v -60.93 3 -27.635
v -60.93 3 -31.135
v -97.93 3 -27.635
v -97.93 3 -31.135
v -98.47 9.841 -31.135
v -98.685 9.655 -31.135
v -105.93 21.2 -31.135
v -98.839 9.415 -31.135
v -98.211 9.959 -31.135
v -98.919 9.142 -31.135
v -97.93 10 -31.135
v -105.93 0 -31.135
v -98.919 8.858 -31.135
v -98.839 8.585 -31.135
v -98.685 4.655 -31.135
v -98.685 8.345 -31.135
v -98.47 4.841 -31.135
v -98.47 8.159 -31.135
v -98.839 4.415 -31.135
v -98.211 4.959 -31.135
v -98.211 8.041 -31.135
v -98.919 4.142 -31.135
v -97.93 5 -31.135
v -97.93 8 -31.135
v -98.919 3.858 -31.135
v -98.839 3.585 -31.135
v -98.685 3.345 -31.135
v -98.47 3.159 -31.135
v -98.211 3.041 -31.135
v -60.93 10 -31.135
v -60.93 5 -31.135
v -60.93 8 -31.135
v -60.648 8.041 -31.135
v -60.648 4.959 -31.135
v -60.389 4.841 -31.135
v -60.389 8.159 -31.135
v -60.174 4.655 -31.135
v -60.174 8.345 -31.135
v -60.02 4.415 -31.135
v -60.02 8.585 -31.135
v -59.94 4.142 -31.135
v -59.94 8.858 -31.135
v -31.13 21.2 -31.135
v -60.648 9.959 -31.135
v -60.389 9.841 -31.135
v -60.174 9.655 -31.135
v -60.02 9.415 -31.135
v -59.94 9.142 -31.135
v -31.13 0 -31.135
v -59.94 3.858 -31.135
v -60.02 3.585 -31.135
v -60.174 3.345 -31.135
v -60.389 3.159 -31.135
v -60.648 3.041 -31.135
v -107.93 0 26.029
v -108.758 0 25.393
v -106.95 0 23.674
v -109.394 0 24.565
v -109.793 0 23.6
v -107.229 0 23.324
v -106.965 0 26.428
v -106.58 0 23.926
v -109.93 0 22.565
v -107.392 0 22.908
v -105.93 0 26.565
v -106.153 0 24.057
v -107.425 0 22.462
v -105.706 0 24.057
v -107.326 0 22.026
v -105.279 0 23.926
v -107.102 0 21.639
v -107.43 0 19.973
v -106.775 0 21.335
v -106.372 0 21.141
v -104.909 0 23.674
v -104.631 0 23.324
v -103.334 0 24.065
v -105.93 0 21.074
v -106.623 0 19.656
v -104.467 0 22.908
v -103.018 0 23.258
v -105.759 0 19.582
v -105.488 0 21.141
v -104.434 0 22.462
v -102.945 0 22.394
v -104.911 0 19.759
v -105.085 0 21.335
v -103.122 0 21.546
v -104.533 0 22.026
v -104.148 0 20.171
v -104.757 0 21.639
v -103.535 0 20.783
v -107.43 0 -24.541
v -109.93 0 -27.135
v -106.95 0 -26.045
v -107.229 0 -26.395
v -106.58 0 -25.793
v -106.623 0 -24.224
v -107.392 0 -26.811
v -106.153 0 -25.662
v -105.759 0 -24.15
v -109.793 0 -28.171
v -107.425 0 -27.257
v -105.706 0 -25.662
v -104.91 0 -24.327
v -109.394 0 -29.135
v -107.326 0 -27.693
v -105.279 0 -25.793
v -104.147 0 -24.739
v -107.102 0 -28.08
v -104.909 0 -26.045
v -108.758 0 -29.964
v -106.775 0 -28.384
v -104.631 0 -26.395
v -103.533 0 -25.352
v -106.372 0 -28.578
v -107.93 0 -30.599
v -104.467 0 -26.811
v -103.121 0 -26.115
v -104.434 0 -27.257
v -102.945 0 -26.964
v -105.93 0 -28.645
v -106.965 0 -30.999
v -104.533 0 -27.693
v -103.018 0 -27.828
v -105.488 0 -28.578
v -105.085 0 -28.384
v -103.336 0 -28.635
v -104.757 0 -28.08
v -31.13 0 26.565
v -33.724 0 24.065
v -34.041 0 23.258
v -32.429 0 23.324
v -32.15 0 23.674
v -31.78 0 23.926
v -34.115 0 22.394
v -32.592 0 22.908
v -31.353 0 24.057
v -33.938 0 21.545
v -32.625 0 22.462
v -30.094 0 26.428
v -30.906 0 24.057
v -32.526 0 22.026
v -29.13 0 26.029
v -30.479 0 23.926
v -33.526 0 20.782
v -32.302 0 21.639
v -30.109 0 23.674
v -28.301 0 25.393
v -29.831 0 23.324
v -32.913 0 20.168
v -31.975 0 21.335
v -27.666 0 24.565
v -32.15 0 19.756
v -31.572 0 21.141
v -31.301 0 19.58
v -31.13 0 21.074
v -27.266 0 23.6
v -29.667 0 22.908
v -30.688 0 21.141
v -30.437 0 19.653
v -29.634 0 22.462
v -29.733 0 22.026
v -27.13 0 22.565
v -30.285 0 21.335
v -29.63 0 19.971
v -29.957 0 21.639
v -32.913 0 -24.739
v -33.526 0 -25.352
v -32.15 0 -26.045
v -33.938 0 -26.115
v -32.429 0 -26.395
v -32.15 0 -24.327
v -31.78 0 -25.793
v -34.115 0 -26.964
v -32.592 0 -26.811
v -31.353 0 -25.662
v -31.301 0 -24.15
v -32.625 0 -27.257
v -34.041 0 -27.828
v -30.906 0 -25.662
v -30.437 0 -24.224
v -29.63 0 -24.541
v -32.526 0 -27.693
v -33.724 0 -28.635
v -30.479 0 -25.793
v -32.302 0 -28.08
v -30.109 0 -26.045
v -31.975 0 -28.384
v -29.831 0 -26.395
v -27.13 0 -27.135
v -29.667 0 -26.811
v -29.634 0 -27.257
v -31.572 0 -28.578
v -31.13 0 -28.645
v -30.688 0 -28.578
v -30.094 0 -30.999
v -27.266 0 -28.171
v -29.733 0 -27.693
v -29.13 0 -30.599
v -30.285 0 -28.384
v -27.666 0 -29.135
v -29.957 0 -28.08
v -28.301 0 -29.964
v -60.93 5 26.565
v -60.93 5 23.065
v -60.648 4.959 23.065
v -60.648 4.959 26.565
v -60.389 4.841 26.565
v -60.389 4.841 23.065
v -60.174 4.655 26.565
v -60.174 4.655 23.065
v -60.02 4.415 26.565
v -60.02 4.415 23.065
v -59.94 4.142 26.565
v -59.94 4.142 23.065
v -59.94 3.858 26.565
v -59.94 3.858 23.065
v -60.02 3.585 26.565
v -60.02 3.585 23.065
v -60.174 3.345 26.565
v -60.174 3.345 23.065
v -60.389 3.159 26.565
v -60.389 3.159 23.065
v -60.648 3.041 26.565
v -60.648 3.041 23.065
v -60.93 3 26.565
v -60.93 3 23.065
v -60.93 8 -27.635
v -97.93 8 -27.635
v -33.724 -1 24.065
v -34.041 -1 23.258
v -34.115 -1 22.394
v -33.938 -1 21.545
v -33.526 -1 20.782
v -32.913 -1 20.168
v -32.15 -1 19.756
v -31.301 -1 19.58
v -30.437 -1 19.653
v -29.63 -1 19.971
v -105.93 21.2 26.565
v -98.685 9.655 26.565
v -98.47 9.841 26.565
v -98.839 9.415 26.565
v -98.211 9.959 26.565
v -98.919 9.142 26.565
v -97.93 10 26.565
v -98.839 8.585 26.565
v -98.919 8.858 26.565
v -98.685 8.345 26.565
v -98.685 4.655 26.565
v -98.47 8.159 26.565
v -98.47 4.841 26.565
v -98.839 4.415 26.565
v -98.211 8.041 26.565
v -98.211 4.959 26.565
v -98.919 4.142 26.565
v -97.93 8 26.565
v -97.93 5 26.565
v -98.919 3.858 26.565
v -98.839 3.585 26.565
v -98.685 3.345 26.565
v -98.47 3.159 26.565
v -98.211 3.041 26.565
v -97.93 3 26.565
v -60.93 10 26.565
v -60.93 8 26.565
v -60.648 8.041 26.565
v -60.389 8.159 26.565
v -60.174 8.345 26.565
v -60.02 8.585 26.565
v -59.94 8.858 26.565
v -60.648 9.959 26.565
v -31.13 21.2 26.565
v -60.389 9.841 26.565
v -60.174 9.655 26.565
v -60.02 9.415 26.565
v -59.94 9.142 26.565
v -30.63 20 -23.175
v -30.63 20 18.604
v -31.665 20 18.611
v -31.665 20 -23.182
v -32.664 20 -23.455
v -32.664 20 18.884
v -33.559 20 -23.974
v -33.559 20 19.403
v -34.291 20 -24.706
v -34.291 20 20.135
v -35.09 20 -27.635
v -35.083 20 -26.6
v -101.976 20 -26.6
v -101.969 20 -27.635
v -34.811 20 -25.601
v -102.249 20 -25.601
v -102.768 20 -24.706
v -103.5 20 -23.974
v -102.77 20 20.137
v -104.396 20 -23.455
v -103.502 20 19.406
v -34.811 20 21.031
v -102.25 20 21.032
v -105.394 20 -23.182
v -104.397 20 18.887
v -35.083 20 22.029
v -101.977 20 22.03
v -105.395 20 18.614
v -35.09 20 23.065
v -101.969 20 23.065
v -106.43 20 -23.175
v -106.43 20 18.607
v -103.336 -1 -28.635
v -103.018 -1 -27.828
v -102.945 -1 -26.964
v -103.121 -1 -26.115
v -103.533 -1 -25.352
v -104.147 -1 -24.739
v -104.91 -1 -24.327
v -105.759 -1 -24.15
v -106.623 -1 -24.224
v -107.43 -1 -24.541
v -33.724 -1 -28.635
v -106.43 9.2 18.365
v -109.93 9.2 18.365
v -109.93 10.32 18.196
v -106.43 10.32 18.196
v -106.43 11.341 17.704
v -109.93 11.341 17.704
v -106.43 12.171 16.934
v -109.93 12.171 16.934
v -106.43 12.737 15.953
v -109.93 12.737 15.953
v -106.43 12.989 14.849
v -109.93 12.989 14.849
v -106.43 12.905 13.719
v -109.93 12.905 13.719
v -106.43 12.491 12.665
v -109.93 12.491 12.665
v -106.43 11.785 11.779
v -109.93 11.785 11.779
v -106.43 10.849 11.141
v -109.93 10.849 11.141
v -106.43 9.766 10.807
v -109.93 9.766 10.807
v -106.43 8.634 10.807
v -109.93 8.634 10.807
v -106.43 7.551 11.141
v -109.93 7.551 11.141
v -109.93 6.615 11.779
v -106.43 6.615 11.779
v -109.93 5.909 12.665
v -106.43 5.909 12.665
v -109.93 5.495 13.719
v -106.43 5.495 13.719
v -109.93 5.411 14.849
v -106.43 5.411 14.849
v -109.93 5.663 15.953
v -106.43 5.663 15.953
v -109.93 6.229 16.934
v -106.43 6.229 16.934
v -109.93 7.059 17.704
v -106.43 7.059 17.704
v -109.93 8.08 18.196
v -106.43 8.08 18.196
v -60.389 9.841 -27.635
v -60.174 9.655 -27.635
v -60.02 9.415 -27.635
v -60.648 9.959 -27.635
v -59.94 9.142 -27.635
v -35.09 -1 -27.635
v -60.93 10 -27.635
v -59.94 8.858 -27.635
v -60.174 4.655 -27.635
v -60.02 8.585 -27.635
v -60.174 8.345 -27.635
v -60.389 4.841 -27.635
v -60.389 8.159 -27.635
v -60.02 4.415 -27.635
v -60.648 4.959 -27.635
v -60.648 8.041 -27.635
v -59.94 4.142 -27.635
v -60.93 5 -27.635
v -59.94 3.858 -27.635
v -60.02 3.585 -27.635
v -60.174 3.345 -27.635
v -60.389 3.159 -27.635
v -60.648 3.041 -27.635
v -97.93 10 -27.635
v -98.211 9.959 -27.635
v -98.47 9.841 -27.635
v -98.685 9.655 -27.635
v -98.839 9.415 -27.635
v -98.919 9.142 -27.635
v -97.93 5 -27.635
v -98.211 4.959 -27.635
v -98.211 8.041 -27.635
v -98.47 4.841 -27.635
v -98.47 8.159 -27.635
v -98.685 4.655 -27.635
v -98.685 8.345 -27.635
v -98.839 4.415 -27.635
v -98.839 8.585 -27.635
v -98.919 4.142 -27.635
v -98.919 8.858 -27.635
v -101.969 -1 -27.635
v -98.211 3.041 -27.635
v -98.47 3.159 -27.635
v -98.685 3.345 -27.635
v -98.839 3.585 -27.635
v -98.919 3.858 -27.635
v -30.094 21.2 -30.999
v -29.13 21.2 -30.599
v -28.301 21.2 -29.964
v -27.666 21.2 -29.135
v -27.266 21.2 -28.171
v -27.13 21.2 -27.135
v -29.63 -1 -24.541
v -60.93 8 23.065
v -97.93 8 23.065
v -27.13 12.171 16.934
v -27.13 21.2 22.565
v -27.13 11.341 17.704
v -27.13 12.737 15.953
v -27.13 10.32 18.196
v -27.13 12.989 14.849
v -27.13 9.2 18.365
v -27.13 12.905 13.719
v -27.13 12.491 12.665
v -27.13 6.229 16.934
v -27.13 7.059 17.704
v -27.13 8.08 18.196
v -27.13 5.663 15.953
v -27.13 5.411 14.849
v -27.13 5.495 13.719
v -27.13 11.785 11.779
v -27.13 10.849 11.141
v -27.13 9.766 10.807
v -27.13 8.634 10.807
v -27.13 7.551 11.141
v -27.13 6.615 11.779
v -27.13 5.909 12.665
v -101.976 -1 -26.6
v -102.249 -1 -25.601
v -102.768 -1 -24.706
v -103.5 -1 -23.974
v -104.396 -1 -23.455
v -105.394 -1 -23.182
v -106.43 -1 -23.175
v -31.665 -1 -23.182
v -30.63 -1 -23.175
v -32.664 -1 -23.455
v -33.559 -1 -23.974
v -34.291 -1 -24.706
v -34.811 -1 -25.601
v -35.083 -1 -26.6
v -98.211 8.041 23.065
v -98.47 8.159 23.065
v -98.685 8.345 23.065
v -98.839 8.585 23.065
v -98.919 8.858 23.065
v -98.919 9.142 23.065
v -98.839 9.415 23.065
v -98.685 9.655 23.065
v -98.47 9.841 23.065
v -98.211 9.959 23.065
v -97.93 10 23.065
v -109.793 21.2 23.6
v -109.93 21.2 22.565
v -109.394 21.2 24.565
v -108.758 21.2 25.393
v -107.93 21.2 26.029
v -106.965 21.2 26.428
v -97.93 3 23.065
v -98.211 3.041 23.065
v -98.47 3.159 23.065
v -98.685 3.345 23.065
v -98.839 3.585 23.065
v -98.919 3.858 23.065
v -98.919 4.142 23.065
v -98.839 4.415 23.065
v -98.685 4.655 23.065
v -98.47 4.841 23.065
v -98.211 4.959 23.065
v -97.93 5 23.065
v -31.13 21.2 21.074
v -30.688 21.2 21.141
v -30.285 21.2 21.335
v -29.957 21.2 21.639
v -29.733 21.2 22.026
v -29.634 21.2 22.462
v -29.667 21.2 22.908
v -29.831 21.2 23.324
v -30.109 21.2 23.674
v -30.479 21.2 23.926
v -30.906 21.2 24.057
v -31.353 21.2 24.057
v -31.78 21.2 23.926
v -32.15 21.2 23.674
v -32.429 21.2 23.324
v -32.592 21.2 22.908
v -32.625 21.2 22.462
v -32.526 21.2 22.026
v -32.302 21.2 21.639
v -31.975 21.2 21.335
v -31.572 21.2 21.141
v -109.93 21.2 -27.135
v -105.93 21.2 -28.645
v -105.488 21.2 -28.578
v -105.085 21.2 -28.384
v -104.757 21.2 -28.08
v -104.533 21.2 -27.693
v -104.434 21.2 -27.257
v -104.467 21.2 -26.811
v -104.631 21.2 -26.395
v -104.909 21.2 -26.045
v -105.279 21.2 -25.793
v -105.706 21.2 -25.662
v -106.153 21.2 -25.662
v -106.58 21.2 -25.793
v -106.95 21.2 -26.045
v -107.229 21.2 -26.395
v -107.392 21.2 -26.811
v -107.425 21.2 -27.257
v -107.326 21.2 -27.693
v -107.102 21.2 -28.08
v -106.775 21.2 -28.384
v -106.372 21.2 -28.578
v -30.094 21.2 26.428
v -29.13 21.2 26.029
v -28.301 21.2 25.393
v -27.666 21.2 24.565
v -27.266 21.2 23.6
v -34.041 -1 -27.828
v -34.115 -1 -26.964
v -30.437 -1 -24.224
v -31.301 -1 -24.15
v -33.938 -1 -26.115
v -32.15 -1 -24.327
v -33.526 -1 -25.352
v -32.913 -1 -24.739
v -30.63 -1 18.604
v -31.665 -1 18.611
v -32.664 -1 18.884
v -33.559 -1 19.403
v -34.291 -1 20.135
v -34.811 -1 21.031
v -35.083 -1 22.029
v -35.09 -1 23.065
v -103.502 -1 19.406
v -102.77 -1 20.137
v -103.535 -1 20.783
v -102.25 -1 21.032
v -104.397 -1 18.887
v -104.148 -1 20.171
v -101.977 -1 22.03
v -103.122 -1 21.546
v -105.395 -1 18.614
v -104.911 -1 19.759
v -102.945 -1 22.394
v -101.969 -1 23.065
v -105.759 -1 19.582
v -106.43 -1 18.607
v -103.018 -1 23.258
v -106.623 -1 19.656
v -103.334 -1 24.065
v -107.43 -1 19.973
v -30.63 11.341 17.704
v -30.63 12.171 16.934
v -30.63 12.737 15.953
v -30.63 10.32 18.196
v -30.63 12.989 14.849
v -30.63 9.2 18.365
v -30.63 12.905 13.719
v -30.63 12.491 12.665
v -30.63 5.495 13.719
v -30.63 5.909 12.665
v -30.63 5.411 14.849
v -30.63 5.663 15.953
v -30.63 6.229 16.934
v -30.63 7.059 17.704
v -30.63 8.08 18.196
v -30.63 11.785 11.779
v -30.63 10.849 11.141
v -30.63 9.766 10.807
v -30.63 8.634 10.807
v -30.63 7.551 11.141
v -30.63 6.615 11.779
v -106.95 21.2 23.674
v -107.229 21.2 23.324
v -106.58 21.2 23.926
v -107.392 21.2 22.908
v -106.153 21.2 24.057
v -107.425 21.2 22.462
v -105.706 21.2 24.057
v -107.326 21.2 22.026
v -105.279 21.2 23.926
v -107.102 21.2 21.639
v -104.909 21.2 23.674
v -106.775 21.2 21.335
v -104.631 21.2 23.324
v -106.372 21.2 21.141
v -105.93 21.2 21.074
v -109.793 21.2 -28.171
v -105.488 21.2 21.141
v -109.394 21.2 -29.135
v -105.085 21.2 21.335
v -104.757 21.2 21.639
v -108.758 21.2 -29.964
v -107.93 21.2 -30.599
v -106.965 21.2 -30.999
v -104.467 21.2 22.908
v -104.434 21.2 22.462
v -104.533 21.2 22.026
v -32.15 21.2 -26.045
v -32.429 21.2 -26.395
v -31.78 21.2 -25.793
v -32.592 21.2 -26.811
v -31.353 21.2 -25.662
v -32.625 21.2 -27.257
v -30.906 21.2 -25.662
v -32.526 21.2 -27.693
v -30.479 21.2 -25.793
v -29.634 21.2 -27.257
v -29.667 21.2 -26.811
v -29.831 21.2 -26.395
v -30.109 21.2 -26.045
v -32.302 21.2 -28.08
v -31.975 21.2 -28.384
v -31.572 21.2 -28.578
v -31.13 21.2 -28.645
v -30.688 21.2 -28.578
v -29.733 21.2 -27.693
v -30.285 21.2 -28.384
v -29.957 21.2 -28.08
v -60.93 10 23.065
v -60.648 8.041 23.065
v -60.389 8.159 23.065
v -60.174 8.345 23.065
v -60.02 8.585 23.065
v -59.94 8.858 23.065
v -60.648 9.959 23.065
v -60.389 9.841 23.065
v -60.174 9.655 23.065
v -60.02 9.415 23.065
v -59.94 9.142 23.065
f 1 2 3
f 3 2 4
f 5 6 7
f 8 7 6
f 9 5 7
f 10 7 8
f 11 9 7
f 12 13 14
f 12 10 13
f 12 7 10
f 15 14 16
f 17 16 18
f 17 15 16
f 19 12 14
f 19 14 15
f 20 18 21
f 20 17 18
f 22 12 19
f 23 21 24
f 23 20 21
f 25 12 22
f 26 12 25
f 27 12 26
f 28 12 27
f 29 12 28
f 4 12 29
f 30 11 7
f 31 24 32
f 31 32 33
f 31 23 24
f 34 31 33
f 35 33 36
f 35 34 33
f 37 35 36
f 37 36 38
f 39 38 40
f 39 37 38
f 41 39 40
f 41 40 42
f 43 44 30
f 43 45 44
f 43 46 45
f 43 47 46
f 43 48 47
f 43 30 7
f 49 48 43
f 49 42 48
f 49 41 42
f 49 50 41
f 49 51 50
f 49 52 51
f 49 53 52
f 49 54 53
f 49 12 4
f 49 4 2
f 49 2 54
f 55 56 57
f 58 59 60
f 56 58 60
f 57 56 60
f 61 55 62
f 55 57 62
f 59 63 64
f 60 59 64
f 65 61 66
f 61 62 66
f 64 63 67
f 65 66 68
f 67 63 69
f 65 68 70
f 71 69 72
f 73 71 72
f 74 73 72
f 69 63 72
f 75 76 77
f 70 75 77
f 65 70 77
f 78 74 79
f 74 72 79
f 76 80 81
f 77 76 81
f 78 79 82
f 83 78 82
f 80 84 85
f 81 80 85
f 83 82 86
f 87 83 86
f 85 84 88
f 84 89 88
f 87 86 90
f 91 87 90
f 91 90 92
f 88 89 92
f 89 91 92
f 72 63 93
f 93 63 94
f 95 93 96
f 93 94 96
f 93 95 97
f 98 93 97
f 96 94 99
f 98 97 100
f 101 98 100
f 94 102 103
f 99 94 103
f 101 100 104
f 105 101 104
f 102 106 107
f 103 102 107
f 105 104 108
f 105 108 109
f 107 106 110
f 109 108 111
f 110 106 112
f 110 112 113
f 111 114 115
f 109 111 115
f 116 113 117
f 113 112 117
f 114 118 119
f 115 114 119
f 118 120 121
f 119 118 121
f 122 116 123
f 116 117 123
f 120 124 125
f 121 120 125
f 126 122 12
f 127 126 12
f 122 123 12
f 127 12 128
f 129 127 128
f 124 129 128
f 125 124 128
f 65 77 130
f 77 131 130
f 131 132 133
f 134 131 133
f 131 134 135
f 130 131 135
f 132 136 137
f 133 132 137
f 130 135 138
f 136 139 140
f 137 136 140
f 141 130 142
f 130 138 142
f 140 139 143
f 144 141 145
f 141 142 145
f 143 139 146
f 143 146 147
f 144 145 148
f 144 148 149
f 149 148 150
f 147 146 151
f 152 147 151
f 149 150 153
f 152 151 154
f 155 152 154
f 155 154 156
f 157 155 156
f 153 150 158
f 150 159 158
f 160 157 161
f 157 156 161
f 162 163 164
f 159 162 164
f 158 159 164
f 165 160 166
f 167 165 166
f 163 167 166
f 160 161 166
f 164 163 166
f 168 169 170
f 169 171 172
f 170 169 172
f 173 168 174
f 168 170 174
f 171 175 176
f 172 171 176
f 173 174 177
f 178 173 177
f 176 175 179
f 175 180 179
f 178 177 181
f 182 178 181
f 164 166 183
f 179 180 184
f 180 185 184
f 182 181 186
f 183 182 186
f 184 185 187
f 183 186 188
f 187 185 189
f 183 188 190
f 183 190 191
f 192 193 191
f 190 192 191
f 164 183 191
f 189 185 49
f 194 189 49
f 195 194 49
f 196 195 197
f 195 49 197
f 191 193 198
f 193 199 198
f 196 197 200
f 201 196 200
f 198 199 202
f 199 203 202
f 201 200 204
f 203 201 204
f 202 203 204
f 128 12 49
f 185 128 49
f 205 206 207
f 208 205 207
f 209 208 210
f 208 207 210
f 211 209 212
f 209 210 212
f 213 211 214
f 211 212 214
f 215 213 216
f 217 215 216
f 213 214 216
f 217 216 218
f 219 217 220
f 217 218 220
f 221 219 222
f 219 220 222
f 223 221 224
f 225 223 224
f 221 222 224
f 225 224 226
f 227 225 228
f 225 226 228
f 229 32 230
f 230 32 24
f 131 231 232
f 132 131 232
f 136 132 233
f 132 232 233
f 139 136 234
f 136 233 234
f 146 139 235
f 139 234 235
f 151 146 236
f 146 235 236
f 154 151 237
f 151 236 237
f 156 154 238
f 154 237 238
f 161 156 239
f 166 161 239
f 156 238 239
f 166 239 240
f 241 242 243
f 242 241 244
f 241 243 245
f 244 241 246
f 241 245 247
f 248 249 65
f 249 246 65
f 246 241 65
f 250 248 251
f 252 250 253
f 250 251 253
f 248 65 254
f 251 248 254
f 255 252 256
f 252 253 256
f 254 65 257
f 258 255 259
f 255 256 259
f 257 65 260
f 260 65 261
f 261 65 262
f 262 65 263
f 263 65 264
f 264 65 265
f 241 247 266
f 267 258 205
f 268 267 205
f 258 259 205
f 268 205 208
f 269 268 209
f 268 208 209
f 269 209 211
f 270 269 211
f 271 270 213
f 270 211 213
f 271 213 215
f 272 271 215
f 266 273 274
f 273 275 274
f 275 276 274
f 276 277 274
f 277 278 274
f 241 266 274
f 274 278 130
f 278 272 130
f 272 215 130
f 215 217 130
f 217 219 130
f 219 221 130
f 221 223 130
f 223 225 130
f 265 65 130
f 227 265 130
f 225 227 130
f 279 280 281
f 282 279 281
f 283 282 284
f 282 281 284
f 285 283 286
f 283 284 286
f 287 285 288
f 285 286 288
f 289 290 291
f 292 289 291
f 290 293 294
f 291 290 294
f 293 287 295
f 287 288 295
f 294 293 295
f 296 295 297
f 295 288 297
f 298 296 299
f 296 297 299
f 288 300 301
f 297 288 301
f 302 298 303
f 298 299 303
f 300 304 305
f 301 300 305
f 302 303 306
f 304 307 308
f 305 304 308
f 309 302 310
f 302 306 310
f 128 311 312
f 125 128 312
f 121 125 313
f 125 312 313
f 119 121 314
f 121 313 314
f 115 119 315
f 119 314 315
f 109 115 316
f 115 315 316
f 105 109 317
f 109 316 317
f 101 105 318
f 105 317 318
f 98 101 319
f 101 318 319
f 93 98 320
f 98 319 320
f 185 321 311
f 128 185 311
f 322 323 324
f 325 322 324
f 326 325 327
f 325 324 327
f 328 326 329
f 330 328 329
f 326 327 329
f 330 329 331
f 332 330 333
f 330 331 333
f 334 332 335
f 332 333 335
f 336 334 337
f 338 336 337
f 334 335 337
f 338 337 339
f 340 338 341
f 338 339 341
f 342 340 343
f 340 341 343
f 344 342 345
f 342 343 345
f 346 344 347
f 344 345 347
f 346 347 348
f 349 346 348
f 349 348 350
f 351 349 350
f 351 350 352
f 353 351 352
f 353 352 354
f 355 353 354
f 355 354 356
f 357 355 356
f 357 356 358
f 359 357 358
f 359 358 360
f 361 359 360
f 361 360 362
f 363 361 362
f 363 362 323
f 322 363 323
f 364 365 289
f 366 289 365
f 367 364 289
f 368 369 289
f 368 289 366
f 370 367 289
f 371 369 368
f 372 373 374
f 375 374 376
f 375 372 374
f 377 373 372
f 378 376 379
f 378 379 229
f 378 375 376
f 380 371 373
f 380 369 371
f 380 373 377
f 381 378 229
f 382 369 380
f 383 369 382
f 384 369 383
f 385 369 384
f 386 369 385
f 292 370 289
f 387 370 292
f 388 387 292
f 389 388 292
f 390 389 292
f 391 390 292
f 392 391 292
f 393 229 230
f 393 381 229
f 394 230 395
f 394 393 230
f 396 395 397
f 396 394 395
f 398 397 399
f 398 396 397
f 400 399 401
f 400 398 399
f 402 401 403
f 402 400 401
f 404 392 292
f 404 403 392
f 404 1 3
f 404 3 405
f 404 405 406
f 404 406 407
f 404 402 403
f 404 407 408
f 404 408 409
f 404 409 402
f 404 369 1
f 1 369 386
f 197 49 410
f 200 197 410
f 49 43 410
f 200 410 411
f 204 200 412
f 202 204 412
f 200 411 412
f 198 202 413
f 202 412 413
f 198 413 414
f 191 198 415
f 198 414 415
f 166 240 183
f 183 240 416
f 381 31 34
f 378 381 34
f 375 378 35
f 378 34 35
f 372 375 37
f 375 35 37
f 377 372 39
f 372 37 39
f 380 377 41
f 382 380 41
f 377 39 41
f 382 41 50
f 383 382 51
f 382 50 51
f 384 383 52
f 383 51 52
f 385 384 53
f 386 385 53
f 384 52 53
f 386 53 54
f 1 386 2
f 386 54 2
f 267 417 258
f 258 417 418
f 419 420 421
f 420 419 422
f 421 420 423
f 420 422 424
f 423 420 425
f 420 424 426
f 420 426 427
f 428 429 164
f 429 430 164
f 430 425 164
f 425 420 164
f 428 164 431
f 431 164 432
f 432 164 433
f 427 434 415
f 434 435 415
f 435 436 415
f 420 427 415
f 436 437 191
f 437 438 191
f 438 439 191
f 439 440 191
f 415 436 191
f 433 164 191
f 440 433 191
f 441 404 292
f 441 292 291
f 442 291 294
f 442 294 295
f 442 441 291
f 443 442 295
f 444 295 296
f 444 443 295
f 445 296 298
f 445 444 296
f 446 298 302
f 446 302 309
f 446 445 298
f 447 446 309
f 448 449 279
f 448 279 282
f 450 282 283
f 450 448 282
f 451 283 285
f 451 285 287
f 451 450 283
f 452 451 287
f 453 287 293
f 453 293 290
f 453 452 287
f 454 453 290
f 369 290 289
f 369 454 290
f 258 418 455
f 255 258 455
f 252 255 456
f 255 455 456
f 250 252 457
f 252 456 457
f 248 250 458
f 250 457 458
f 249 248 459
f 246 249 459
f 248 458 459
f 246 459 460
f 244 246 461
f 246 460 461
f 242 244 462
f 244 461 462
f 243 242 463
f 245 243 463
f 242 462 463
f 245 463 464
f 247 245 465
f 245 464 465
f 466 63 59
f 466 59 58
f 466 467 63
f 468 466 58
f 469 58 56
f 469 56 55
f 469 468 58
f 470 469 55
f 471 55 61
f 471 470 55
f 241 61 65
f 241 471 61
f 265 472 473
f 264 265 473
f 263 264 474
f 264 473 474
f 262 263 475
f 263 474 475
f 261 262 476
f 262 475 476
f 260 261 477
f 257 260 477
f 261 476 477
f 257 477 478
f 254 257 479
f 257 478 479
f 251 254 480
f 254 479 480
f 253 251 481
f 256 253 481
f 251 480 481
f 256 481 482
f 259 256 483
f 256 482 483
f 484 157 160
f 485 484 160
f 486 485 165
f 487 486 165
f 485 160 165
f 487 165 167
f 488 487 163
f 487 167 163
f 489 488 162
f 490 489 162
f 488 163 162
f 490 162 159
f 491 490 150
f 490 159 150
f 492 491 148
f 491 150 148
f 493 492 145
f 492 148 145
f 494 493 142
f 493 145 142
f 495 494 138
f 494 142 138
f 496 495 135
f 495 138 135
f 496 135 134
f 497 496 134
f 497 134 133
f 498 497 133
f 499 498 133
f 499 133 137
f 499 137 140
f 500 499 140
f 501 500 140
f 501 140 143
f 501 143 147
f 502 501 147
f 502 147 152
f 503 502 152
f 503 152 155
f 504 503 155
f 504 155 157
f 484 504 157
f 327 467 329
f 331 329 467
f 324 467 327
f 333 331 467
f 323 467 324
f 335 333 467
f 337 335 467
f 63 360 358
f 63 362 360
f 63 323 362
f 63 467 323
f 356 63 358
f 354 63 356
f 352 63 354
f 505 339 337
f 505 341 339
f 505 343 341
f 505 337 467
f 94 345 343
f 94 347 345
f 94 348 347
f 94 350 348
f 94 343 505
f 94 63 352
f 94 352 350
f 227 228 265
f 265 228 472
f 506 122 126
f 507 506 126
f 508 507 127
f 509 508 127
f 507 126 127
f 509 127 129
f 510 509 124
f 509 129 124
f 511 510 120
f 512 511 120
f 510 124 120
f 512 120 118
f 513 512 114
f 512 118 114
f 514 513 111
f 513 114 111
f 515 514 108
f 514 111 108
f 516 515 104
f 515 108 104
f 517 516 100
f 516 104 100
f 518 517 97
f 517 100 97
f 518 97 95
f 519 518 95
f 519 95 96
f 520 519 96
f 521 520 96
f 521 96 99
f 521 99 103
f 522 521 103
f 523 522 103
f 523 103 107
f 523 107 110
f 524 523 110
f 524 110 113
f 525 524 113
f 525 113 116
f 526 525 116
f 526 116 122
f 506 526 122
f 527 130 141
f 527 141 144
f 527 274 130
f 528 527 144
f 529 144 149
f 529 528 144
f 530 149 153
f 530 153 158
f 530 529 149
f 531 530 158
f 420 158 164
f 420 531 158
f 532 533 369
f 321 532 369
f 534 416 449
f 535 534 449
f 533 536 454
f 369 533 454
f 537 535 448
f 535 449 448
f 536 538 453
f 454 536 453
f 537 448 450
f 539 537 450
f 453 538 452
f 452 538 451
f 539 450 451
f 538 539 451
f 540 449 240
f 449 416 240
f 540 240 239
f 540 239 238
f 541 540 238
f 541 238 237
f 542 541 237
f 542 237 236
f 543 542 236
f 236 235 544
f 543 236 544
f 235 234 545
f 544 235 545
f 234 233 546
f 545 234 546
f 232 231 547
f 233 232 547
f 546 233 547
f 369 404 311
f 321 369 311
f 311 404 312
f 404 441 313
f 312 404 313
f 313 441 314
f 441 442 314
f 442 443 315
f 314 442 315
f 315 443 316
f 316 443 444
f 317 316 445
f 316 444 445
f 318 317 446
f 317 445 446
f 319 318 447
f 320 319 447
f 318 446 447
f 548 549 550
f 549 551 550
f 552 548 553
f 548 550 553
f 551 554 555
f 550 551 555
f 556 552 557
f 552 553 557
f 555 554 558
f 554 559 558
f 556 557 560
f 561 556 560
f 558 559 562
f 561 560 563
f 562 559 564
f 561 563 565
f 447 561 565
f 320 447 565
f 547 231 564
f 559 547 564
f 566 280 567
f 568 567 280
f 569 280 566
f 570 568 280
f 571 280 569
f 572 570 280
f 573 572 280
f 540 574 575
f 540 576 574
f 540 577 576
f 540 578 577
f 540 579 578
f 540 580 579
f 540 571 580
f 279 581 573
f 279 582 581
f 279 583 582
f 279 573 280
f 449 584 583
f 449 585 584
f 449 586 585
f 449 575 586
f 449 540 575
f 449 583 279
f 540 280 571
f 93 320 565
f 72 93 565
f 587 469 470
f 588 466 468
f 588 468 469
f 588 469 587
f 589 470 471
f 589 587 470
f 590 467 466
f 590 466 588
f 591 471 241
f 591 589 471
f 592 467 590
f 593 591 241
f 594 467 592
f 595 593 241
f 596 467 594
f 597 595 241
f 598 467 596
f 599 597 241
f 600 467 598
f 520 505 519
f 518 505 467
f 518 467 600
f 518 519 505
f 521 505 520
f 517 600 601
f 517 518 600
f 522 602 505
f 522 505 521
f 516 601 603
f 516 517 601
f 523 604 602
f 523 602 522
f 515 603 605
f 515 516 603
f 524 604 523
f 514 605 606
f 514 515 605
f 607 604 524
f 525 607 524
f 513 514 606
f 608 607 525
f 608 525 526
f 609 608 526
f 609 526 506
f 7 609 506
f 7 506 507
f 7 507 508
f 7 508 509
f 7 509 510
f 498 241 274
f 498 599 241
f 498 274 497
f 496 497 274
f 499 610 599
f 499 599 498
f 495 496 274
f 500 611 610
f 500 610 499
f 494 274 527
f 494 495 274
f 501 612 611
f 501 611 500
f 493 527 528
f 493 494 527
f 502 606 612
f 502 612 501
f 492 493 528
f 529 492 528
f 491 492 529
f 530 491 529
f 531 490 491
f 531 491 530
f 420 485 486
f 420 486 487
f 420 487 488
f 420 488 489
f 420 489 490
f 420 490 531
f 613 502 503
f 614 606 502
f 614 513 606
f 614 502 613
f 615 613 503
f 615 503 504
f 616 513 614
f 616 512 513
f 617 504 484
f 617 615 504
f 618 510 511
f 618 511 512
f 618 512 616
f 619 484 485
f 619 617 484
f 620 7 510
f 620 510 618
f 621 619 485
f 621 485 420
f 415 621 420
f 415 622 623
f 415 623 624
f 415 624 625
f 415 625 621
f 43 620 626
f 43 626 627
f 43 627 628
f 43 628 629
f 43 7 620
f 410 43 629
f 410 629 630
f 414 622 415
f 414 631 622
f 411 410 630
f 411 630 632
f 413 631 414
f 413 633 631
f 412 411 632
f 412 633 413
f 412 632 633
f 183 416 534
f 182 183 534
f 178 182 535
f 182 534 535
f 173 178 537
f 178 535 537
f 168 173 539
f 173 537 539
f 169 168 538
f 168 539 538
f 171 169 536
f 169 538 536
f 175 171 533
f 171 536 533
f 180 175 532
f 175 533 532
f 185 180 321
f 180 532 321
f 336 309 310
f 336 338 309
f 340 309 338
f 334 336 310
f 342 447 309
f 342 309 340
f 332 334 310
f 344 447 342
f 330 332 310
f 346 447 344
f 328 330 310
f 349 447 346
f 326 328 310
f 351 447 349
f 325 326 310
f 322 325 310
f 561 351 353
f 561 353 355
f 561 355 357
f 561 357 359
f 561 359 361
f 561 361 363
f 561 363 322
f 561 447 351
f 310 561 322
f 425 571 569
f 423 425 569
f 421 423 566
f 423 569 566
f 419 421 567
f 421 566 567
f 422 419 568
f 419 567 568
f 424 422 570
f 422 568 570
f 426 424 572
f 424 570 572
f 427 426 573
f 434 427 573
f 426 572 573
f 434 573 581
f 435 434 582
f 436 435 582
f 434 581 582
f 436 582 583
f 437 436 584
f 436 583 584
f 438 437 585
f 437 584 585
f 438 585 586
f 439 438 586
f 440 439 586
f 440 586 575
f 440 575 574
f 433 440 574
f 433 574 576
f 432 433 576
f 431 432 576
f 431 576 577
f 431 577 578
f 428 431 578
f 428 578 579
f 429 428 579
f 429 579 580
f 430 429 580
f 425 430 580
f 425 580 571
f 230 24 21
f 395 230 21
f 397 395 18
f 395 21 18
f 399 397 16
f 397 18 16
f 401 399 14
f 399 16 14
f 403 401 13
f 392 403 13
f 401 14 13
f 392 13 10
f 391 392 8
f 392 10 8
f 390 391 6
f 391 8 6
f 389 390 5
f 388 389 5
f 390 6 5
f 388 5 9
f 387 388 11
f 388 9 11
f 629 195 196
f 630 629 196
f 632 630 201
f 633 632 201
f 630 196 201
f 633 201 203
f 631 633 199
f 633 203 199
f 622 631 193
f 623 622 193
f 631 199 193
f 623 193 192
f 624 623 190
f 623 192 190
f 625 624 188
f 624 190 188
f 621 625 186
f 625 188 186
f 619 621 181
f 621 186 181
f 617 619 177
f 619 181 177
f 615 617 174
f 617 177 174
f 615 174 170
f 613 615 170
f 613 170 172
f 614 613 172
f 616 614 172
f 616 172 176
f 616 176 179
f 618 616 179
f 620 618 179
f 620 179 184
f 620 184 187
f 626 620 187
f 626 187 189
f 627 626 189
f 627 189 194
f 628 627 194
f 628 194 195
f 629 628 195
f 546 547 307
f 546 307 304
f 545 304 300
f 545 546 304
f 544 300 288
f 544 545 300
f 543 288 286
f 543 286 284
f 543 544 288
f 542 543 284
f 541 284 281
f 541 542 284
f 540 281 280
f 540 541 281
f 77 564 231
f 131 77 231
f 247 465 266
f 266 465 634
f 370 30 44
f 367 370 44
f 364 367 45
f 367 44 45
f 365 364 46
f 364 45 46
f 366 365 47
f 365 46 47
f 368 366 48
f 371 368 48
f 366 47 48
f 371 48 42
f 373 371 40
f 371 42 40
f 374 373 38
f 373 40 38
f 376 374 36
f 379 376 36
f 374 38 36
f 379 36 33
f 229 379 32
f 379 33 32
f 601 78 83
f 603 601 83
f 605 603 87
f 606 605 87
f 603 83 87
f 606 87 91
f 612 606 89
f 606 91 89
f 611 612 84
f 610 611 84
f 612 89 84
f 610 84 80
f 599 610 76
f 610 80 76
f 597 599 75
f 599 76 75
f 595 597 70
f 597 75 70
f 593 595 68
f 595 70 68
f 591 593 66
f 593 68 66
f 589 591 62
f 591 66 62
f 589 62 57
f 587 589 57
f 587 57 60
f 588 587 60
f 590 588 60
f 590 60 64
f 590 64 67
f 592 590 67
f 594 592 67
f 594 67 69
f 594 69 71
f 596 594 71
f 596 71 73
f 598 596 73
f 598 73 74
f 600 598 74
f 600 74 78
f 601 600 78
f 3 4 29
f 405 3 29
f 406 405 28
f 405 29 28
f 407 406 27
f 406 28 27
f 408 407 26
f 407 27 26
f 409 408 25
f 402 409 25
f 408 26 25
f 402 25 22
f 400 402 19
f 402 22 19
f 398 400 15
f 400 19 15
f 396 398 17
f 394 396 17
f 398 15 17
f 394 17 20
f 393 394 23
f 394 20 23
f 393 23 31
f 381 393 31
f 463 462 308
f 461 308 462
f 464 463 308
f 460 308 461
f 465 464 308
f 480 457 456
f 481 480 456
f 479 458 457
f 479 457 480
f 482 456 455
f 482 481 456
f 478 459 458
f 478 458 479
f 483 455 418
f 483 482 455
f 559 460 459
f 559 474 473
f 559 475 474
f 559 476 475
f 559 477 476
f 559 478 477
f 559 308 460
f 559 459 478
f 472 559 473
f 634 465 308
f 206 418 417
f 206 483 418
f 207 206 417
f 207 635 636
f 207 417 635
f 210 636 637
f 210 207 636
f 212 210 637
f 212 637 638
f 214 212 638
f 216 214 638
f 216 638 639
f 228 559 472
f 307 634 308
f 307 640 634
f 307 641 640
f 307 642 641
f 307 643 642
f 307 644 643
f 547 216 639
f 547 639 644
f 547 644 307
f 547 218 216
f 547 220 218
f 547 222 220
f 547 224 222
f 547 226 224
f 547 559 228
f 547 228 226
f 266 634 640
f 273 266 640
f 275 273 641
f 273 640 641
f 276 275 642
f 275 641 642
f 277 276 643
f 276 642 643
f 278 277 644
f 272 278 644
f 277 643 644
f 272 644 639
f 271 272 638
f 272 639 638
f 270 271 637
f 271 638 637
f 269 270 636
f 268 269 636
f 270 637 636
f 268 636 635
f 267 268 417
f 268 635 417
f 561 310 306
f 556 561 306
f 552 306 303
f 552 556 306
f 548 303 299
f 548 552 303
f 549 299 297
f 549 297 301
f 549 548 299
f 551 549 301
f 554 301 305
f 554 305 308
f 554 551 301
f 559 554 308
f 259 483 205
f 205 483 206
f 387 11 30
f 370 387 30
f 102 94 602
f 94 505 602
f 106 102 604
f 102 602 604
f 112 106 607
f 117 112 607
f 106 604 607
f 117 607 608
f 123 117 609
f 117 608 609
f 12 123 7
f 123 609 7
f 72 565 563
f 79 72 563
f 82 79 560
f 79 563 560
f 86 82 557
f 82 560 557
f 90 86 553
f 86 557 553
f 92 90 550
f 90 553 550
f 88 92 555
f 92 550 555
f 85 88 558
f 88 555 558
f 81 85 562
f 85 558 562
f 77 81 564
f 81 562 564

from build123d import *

# Parameters (mm, degrees)
SKETCH1_W           = 82.8
SKETCH1_H           = 57.7
BOSS_EXTRUDE1_DEPTH = 21.2
SKETCH2_R           = 1.5
CUT_EXTRUDE1_DEPTH  = 22
CUT_EXTRUDE2_DEPTH  = 20
FILLET3_R           = 4
BOSS_EXTRUDE3_START = 1
BOSS_EXTRUDE3_DEPTH = 1
CUT_EXTRUDE6_DEPTH  = 126.949440358
SKETCH8_R           = 3.8
CUT_EXTRUDE7_DEPTH  = 91.96532852


with BuildPart() as part:
    # Sketch1 → Boss-Extrude1 (new body)
    with BuildSketch(Plane(origin=(0, 0, 0), x_dir=(1, 0, 0), z_dir=(0, 1, 0))):
        with Locations((-68.529666271, 2.285365627)):
            Rectangle(SKETCH1_W, SKETCH1_H)
    extrude(amount=BOSS_EXTRUDE1_DEPTH)

    # Sketch2 → Cut-Extrude1 (cut)
    with BuildSketch(Plane.XZ):
        with Locations((-105.929666271, 22.574078856)):
            Circle(SKETCH2_R)
        with Locations((-31.129666271, 22.574078856)):
            Circle(SKETCH2_R)
        with Locations((-105.929666271, -27.14481011)):
            Circle(SKETCH2_R)
        with Locations((-31.129666271, -27.14481011)):
            Circle(SKETCH2_R)
    extrude(amount=-CUT_EXTRUDE1_DEPTH, mode=Mode.SUBTRACT)

    # Sketch3 → Cut-Extrude2 (cut)
    with BuildSketch(Plane.XZ):
        with BuildLine():
            Line((-101.969305307, 23.064634373), (-35.090027235, 23.064634373))
            ThreePointArc((-35.090027235, 23.064634373), (-33.948648913, 19.745651731), (-30.629666271, 18.604273409))
            Line((-30.629666271, 18.604273409), (-30.629666271, -23.175004663))
            ThreePointArc((-30.629666271, -23.175004663), (-33.948648913, -24.316382985), (-35.090027235, -27.635365627))
            Line((-35.090027235, -27.635365627), (-101.969305307, -27.635365627))
            ThreePointArc((-101.969305307, -27.635365627), (-103.110683629, -24.316382985), (-106.429666271, -23.175004663))
            Line((-106.429666271, -23.175004663), (-106.429666271, 18.607164142))
            ThreePointArc((-106.429666271, 18.607164142), (-103.111962249, 19.747670443), (-101.969305307, 23.064634373))
        make_face()
    extrude(amount=-CUT_EXTRUDE2_DEPTH, mode=Mode.SUBTRACT)

    # Fillet3
    fillet3_edges = [part.edges().sort_by_distance(p)[0] for p in [
        (-27.129666271, 10.6, 26.564634373),
        (-109.929666271, 10.6, 26.564634373),
        (-109.929666271, 10.6, -31.135365627),
        (-27.129666271, 10.6, -31.135365627),
    ]]
    fillet(fillet3_edges, radius=FILLET3_R)

    # Sketch3<8> → Boss-Extrude3 (add)
    with BuildSketch(Plane.XZ.offset(BOSS_EXTRUDE3_START)):
        with BuildLine():
            Line((-103.334287863, 24.064634373), (-33.723727934, 24.064634373))
            ThreePointArc((-33.723727934, 24.064634373), (-33.241542132, 20.452758513), (-29.629666271, 19.97057271))
            Line((-29.629666271, 19.97057271), (-29.629666271, -24.541303964))
            ThreePointArc((-29.629666271, -24.541303964), (-33.241542132, -25.023489766), (-33.723727934, -28.635365627))
            Line((-33.723727934, -28.635365627), (-103.335604608, -28.635365627))
            ThreePointArc((-103.335604608, -28.635365627), (-103.817790411, -25.023489766), (-107.429666271, -24.541303964))
            Line((-107.429666271, -24.541303964), (-107.429666271, 19.973301106))
            ThreePointArc((-107.429666271, 19.973301106), (-103.819200468, 20.454646008), (-103.334287863, 24.064634373))
        make_face()
        with BuildLine():
            Line((-101.969305307, 23.064634373), (-35.090027235, 23.064634373))
            ThreePointArc((-35.090027235, 23.064634373), (-33.948648913, 19.745651731), (-30.629666271, 18.604273409))
            Line((-30.629666271, 18.604273409), (-30.629666271, -23.175004663))
            ThreePointArc((-30.629666271, -23.175004663), (-33.948648913, -24.316382985), (-35.090027235, -27.635365627))
            Line((-35.090027235, -27.635365627), (-101.969305307, -27.635365627))
            ThreePointArc((-101.969305307, -27.635365627), (-103.110683629, -24.316382985), (-106.429666271, -23.175004663))
            Line((-106.429666271, -23.175004663), (-106.429666271, 18.607164142))
            ThreePointArc((-106.429666271, 18.607164142), (-103.111962249, 19.747670443), (-101.969305307, 23.064634373))
        make_face(mode=Mode.SUBTRACT)
    extrude(amount=-BOSS_EXTRUDE3_DEPTH)

    # Sketch7 → Cut-Extrude6 (cut, through all)
    with BuildSketch(Plane(origin=(0, 0, -31.135365627), x_dir=(-1, 0, 0), z_dir=(0, 0, -1))):
        with BuildLine():
            Line((60.929666271, 3), (97.929666271, 3))
            ThreePointArc((97.929666271, 3), (98.929666271, 4), (97.929666271, 5))
            Line((97.929666271, 5), (60.929666271, 5))
            ThreePointArc((60.929666271, 5), (59.929666271, 4), (60.929666271, 3))
        make_face()
        with BuildLine():
            Line((60.929666271, 8), (97.929666271, 8))
            ThreePointArc((97.929666271, 8), (98.929666271, 9), (97.929666271, 10))
            Line((97.929666271, 10), (60.929666271, 10))
            ThreePointArc((60.929666271, 10), (59.929666271, 9), (60.929666271, 8))
        make_face()
    extrude(amount=-CUT_EXTRUDE6_DEPTH, mode=Mode.SUBTRACT)

    # Sketch8 → Cut-Extrude7 (cut, through all)
    with BuildSketch(Plane.ZY.offset(109.929666271)):
        with Locations((14.564634373, 9.2)):
            Circle(SKETCH8_R)
    extrude(amount=-CUT_EXTRUDE7_DEPTH, mode=Mode.SUBTRACT)


solid = part.part
